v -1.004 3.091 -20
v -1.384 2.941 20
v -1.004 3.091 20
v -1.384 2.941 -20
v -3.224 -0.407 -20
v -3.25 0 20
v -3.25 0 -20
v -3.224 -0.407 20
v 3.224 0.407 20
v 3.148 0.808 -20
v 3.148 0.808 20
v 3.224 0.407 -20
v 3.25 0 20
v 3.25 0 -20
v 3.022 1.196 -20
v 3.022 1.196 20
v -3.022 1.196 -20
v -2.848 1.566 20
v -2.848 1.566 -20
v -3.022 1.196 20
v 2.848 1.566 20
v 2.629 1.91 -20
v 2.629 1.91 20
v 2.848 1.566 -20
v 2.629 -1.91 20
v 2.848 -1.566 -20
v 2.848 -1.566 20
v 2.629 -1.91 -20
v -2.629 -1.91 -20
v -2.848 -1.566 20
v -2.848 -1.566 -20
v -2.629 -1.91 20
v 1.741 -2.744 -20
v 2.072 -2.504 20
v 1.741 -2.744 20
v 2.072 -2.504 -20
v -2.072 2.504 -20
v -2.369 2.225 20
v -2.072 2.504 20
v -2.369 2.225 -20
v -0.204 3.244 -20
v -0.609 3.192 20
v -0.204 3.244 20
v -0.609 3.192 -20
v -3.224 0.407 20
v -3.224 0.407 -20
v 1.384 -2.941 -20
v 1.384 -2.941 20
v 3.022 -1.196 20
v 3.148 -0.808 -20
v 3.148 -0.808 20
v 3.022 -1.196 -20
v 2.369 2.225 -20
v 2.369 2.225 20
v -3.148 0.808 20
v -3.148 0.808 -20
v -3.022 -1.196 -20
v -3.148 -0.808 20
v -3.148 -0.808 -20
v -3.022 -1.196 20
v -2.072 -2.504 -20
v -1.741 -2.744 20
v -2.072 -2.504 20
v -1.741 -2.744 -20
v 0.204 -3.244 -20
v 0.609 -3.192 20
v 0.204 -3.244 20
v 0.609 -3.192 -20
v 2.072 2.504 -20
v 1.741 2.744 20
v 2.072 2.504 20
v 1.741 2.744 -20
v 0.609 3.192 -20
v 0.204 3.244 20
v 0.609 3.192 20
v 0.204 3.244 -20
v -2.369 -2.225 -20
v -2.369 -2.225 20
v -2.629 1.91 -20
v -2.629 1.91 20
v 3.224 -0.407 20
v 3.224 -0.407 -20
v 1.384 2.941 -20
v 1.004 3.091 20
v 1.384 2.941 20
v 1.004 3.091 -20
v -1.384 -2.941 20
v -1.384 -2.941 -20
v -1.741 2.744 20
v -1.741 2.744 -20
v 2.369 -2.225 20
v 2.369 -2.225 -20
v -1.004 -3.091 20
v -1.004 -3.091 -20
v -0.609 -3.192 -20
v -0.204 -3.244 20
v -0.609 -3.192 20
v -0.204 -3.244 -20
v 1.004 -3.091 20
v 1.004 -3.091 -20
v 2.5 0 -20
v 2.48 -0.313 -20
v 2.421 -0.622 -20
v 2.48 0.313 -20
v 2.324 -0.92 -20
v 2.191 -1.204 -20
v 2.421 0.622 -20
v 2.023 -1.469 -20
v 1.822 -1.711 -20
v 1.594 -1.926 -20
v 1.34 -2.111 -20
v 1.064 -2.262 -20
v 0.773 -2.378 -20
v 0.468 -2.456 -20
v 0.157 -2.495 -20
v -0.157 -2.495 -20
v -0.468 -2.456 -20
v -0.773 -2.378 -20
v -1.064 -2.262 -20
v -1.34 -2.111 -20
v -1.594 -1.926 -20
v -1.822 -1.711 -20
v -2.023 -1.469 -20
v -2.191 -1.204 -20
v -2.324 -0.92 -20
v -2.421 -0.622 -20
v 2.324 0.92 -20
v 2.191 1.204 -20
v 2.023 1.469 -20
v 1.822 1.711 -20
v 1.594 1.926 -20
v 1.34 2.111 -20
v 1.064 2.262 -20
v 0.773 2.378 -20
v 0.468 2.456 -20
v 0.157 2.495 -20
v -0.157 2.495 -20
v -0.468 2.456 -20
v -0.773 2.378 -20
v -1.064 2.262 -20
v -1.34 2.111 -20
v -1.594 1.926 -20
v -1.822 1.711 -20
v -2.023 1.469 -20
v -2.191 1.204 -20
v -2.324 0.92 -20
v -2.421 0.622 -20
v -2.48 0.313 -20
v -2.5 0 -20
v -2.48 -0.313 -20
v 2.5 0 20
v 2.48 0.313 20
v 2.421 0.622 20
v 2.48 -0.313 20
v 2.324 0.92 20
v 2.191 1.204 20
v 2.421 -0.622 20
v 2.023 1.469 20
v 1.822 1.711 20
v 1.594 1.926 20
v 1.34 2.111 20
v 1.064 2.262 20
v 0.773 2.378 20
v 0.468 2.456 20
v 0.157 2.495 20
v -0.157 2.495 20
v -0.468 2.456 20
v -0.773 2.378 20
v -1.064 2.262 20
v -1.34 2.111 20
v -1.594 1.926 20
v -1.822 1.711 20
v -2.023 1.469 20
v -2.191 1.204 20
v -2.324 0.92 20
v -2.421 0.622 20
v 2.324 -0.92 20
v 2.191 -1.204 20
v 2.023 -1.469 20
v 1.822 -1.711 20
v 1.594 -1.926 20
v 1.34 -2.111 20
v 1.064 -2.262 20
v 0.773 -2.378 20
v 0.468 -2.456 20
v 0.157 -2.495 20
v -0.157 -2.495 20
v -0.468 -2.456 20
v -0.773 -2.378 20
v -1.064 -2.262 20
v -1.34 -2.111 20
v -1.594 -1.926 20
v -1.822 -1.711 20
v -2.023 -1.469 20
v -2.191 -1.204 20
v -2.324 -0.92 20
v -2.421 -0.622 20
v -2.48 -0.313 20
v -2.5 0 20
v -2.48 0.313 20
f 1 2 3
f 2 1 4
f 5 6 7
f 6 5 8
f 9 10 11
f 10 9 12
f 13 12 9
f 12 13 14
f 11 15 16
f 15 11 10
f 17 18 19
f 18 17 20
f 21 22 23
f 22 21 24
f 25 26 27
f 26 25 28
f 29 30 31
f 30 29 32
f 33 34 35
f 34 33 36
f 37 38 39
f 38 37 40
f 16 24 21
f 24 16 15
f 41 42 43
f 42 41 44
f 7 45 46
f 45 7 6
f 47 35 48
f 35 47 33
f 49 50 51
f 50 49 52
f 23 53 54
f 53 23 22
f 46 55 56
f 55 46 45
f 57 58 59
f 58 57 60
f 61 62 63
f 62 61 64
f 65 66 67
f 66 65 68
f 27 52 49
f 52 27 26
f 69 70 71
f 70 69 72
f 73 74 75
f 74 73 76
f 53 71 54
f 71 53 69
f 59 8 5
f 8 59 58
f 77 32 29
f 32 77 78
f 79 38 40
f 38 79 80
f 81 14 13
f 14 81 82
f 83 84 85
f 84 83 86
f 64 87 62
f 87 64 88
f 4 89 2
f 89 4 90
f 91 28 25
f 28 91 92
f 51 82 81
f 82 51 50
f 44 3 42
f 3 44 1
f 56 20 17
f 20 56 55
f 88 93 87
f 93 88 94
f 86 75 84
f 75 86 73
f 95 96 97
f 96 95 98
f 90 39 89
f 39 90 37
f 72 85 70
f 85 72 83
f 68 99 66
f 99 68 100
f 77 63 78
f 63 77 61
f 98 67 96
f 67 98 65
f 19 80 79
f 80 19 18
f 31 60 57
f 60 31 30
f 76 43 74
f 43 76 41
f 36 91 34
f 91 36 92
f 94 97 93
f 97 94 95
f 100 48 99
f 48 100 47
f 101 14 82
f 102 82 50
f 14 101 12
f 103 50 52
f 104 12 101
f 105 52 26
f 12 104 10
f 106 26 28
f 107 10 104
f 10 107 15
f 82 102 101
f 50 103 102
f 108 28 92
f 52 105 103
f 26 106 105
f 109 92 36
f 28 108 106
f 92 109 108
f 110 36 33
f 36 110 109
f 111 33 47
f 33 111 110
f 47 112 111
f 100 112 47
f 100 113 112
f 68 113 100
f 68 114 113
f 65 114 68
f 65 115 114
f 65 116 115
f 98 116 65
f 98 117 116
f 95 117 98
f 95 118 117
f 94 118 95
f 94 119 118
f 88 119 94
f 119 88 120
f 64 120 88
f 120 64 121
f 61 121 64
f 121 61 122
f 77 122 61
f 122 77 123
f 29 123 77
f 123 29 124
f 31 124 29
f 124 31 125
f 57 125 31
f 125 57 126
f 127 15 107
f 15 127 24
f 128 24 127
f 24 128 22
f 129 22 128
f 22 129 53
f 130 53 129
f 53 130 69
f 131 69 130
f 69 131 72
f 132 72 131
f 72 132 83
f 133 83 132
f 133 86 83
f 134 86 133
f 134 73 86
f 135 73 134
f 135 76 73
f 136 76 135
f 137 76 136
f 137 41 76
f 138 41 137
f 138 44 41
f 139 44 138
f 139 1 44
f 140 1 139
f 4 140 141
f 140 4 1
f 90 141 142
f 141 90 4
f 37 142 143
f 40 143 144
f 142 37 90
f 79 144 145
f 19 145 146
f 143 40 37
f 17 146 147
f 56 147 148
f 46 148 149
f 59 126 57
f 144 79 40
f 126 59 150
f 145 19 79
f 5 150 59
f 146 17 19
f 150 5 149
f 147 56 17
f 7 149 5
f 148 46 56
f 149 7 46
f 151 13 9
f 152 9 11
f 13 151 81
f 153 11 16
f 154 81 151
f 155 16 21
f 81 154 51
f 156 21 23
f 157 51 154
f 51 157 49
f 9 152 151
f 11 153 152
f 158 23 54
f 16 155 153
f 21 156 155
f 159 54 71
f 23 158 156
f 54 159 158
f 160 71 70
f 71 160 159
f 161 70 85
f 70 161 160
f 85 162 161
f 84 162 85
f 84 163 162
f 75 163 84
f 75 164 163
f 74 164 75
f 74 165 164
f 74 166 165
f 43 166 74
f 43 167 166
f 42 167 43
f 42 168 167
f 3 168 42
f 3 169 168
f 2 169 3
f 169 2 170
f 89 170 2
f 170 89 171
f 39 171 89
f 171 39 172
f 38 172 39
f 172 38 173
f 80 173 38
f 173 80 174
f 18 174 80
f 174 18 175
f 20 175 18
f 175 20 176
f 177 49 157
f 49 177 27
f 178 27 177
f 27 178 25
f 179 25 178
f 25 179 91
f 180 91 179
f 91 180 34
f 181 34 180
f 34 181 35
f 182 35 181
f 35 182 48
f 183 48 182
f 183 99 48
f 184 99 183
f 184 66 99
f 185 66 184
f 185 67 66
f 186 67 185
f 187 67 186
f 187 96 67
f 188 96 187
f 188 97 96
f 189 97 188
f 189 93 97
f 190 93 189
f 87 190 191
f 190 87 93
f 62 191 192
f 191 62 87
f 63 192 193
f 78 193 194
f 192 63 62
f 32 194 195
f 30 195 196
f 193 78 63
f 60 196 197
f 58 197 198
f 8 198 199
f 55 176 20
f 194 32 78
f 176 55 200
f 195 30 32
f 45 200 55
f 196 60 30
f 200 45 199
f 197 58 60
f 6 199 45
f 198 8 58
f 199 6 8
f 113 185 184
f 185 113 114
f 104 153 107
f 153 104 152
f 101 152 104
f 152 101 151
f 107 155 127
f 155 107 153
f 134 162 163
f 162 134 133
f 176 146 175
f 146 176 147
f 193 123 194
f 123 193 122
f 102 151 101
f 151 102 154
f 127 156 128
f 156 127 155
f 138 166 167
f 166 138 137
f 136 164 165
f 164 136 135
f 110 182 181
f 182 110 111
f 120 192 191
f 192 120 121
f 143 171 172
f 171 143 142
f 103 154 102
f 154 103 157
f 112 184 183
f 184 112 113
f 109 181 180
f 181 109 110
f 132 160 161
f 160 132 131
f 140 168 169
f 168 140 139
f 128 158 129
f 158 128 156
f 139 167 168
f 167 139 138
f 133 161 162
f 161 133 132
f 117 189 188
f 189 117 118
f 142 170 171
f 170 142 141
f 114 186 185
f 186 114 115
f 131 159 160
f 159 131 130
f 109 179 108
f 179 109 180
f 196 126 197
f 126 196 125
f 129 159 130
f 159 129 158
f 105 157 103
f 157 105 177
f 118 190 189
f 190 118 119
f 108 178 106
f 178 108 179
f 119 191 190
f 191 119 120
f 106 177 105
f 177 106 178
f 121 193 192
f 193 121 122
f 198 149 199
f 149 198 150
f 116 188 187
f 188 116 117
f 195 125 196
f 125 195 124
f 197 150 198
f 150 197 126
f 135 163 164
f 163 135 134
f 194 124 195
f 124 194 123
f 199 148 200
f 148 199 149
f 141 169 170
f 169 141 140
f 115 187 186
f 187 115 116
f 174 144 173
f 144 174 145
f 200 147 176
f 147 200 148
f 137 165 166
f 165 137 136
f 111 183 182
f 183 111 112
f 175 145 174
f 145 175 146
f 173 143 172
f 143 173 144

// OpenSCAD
$fn = 50;


difference() {
	union() {
		translate(v = [0, 0, -20.0000000000]) {
			cylinder(h = 40, r = 3.2500000000);
		}
	}
	union() {
		translate(v = [0, 0, -100.0000000000]) {
			cylinder(h = 200, r = 2.5000000000);
		}
	}
}
